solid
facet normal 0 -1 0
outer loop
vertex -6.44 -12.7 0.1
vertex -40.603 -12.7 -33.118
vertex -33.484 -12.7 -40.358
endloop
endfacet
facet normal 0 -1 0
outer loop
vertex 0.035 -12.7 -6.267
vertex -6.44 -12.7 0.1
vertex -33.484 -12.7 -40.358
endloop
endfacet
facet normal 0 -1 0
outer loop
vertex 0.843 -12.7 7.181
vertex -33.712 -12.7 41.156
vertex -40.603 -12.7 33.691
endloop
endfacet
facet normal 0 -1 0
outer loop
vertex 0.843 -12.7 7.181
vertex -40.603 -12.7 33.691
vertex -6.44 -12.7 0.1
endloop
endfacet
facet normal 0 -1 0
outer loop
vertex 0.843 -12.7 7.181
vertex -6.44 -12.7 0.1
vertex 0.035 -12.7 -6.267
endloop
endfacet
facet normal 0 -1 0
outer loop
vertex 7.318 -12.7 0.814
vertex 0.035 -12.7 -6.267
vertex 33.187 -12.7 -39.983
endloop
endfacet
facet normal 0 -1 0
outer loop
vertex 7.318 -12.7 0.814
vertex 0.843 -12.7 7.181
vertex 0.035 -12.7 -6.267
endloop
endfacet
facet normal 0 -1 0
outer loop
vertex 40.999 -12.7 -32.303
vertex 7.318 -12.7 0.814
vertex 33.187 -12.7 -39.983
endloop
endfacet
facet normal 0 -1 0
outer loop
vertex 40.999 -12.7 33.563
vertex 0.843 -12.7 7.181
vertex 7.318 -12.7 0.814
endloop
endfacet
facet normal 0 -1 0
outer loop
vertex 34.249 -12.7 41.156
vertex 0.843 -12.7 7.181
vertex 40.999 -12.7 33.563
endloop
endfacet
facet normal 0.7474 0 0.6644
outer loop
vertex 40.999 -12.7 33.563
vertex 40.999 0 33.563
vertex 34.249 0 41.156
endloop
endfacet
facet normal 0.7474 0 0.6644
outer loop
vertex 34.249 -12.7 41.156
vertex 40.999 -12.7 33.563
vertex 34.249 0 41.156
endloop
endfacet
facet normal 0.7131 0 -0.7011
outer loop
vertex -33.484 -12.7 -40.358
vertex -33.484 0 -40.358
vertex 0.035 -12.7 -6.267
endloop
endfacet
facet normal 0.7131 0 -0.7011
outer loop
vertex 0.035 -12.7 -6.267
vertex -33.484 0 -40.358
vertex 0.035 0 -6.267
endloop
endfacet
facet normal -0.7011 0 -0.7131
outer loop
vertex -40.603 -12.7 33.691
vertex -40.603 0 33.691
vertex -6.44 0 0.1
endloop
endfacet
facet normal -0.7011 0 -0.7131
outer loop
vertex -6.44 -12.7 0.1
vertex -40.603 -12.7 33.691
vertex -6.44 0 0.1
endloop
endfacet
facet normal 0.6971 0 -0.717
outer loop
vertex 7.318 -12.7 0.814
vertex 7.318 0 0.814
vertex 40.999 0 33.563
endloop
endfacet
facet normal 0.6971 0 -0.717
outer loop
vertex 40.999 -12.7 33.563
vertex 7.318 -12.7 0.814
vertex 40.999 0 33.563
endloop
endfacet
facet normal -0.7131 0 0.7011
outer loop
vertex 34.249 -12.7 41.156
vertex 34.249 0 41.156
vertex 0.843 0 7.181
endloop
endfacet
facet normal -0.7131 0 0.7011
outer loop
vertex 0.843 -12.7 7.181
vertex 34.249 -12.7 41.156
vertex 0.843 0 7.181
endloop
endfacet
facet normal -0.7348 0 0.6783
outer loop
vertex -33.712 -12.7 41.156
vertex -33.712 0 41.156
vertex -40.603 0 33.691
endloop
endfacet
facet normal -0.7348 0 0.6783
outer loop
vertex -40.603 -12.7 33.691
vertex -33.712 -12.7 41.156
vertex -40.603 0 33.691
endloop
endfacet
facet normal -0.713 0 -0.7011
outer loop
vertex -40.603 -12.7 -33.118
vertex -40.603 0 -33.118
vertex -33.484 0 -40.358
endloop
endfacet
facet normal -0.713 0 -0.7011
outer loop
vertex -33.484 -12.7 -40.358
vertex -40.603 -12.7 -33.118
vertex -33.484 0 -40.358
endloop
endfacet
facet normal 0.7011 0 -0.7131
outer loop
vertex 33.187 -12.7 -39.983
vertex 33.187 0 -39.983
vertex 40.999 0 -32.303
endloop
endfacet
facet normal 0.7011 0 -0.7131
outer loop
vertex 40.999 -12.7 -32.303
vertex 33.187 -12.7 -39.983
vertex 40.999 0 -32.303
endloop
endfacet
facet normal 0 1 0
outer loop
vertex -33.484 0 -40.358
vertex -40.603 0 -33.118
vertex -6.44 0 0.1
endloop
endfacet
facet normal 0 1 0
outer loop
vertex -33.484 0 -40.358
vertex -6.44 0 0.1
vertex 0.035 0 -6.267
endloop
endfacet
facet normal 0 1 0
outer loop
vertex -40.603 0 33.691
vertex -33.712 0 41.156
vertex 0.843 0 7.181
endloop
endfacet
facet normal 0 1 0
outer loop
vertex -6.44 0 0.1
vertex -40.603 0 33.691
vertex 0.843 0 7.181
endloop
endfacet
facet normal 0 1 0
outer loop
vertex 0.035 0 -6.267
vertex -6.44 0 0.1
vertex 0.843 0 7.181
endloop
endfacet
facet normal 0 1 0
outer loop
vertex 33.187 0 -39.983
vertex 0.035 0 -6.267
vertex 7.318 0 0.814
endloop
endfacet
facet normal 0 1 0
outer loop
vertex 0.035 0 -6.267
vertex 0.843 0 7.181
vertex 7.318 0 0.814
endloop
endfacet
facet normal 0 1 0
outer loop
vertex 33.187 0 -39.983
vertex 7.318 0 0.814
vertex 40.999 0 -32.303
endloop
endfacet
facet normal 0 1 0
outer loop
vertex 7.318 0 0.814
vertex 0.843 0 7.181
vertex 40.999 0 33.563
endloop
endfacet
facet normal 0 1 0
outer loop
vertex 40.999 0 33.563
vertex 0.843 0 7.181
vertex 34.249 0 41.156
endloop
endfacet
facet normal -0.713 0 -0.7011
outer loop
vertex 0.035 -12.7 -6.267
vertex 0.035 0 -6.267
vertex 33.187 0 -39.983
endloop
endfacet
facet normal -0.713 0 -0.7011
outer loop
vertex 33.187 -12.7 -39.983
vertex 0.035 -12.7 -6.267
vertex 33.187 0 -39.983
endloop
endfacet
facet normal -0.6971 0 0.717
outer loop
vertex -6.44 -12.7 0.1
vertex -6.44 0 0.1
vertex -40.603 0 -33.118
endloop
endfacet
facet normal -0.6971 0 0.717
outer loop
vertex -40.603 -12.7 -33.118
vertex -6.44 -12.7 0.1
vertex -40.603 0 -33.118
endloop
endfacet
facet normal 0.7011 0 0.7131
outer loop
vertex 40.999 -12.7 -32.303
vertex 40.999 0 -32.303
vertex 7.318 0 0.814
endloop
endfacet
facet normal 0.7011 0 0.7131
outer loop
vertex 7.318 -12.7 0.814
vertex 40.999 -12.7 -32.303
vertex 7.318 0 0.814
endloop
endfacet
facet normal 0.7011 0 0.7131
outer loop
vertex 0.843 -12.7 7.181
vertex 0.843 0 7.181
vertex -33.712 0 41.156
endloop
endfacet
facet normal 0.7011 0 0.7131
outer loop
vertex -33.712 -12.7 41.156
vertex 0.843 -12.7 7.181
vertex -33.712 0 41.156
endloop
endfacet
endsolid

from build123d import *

# Parameters (mm, degrees)
F1_DEPTH = 12.7


with BuildPart() as f1:
    # F0 (on Front) → F1 (new body)
    with BuildSketch(Plane.XZ):
        Polygon((-33.7118367519, 41.1562249064), (-40.6031636763, 33.6906229065), (-6.4398701091, 0.0998017263), (0.842697291, 7.1807192451), align=None)
        Polygon((0.842697291, 7.1807192451), (-6.4398701091, 0.0998017263), (-2.4844633379, -3.7893245163), (0.0352224959, -6.2667881165), (7.317789896, 0.8141294024), align=None)
        Polygon((-2.4844633379, -3.7893245163), (-6.4398701091, 0.0998017263), (-40.6031636763, -33.1175309299), (-33.4843747504, -40.357643914), (0.0352224959, -6.2667881165), align=None)
        Polygon((34.2488773167, 41.1562249064), (0.842697291, 7.1807192451), (7.317789896, 0.8141294024), (40.9988134673, 33.5625458269), align=None)
        Polygon((40.9988134673, -32.3025031532), (7.317789896, 0.8141294024), (0.0352224959, -6.2667881165), (33.1869239615, -39.9834872244), align=None)
    extrude(amount=F1_DEPTH)


solid = f1.part
